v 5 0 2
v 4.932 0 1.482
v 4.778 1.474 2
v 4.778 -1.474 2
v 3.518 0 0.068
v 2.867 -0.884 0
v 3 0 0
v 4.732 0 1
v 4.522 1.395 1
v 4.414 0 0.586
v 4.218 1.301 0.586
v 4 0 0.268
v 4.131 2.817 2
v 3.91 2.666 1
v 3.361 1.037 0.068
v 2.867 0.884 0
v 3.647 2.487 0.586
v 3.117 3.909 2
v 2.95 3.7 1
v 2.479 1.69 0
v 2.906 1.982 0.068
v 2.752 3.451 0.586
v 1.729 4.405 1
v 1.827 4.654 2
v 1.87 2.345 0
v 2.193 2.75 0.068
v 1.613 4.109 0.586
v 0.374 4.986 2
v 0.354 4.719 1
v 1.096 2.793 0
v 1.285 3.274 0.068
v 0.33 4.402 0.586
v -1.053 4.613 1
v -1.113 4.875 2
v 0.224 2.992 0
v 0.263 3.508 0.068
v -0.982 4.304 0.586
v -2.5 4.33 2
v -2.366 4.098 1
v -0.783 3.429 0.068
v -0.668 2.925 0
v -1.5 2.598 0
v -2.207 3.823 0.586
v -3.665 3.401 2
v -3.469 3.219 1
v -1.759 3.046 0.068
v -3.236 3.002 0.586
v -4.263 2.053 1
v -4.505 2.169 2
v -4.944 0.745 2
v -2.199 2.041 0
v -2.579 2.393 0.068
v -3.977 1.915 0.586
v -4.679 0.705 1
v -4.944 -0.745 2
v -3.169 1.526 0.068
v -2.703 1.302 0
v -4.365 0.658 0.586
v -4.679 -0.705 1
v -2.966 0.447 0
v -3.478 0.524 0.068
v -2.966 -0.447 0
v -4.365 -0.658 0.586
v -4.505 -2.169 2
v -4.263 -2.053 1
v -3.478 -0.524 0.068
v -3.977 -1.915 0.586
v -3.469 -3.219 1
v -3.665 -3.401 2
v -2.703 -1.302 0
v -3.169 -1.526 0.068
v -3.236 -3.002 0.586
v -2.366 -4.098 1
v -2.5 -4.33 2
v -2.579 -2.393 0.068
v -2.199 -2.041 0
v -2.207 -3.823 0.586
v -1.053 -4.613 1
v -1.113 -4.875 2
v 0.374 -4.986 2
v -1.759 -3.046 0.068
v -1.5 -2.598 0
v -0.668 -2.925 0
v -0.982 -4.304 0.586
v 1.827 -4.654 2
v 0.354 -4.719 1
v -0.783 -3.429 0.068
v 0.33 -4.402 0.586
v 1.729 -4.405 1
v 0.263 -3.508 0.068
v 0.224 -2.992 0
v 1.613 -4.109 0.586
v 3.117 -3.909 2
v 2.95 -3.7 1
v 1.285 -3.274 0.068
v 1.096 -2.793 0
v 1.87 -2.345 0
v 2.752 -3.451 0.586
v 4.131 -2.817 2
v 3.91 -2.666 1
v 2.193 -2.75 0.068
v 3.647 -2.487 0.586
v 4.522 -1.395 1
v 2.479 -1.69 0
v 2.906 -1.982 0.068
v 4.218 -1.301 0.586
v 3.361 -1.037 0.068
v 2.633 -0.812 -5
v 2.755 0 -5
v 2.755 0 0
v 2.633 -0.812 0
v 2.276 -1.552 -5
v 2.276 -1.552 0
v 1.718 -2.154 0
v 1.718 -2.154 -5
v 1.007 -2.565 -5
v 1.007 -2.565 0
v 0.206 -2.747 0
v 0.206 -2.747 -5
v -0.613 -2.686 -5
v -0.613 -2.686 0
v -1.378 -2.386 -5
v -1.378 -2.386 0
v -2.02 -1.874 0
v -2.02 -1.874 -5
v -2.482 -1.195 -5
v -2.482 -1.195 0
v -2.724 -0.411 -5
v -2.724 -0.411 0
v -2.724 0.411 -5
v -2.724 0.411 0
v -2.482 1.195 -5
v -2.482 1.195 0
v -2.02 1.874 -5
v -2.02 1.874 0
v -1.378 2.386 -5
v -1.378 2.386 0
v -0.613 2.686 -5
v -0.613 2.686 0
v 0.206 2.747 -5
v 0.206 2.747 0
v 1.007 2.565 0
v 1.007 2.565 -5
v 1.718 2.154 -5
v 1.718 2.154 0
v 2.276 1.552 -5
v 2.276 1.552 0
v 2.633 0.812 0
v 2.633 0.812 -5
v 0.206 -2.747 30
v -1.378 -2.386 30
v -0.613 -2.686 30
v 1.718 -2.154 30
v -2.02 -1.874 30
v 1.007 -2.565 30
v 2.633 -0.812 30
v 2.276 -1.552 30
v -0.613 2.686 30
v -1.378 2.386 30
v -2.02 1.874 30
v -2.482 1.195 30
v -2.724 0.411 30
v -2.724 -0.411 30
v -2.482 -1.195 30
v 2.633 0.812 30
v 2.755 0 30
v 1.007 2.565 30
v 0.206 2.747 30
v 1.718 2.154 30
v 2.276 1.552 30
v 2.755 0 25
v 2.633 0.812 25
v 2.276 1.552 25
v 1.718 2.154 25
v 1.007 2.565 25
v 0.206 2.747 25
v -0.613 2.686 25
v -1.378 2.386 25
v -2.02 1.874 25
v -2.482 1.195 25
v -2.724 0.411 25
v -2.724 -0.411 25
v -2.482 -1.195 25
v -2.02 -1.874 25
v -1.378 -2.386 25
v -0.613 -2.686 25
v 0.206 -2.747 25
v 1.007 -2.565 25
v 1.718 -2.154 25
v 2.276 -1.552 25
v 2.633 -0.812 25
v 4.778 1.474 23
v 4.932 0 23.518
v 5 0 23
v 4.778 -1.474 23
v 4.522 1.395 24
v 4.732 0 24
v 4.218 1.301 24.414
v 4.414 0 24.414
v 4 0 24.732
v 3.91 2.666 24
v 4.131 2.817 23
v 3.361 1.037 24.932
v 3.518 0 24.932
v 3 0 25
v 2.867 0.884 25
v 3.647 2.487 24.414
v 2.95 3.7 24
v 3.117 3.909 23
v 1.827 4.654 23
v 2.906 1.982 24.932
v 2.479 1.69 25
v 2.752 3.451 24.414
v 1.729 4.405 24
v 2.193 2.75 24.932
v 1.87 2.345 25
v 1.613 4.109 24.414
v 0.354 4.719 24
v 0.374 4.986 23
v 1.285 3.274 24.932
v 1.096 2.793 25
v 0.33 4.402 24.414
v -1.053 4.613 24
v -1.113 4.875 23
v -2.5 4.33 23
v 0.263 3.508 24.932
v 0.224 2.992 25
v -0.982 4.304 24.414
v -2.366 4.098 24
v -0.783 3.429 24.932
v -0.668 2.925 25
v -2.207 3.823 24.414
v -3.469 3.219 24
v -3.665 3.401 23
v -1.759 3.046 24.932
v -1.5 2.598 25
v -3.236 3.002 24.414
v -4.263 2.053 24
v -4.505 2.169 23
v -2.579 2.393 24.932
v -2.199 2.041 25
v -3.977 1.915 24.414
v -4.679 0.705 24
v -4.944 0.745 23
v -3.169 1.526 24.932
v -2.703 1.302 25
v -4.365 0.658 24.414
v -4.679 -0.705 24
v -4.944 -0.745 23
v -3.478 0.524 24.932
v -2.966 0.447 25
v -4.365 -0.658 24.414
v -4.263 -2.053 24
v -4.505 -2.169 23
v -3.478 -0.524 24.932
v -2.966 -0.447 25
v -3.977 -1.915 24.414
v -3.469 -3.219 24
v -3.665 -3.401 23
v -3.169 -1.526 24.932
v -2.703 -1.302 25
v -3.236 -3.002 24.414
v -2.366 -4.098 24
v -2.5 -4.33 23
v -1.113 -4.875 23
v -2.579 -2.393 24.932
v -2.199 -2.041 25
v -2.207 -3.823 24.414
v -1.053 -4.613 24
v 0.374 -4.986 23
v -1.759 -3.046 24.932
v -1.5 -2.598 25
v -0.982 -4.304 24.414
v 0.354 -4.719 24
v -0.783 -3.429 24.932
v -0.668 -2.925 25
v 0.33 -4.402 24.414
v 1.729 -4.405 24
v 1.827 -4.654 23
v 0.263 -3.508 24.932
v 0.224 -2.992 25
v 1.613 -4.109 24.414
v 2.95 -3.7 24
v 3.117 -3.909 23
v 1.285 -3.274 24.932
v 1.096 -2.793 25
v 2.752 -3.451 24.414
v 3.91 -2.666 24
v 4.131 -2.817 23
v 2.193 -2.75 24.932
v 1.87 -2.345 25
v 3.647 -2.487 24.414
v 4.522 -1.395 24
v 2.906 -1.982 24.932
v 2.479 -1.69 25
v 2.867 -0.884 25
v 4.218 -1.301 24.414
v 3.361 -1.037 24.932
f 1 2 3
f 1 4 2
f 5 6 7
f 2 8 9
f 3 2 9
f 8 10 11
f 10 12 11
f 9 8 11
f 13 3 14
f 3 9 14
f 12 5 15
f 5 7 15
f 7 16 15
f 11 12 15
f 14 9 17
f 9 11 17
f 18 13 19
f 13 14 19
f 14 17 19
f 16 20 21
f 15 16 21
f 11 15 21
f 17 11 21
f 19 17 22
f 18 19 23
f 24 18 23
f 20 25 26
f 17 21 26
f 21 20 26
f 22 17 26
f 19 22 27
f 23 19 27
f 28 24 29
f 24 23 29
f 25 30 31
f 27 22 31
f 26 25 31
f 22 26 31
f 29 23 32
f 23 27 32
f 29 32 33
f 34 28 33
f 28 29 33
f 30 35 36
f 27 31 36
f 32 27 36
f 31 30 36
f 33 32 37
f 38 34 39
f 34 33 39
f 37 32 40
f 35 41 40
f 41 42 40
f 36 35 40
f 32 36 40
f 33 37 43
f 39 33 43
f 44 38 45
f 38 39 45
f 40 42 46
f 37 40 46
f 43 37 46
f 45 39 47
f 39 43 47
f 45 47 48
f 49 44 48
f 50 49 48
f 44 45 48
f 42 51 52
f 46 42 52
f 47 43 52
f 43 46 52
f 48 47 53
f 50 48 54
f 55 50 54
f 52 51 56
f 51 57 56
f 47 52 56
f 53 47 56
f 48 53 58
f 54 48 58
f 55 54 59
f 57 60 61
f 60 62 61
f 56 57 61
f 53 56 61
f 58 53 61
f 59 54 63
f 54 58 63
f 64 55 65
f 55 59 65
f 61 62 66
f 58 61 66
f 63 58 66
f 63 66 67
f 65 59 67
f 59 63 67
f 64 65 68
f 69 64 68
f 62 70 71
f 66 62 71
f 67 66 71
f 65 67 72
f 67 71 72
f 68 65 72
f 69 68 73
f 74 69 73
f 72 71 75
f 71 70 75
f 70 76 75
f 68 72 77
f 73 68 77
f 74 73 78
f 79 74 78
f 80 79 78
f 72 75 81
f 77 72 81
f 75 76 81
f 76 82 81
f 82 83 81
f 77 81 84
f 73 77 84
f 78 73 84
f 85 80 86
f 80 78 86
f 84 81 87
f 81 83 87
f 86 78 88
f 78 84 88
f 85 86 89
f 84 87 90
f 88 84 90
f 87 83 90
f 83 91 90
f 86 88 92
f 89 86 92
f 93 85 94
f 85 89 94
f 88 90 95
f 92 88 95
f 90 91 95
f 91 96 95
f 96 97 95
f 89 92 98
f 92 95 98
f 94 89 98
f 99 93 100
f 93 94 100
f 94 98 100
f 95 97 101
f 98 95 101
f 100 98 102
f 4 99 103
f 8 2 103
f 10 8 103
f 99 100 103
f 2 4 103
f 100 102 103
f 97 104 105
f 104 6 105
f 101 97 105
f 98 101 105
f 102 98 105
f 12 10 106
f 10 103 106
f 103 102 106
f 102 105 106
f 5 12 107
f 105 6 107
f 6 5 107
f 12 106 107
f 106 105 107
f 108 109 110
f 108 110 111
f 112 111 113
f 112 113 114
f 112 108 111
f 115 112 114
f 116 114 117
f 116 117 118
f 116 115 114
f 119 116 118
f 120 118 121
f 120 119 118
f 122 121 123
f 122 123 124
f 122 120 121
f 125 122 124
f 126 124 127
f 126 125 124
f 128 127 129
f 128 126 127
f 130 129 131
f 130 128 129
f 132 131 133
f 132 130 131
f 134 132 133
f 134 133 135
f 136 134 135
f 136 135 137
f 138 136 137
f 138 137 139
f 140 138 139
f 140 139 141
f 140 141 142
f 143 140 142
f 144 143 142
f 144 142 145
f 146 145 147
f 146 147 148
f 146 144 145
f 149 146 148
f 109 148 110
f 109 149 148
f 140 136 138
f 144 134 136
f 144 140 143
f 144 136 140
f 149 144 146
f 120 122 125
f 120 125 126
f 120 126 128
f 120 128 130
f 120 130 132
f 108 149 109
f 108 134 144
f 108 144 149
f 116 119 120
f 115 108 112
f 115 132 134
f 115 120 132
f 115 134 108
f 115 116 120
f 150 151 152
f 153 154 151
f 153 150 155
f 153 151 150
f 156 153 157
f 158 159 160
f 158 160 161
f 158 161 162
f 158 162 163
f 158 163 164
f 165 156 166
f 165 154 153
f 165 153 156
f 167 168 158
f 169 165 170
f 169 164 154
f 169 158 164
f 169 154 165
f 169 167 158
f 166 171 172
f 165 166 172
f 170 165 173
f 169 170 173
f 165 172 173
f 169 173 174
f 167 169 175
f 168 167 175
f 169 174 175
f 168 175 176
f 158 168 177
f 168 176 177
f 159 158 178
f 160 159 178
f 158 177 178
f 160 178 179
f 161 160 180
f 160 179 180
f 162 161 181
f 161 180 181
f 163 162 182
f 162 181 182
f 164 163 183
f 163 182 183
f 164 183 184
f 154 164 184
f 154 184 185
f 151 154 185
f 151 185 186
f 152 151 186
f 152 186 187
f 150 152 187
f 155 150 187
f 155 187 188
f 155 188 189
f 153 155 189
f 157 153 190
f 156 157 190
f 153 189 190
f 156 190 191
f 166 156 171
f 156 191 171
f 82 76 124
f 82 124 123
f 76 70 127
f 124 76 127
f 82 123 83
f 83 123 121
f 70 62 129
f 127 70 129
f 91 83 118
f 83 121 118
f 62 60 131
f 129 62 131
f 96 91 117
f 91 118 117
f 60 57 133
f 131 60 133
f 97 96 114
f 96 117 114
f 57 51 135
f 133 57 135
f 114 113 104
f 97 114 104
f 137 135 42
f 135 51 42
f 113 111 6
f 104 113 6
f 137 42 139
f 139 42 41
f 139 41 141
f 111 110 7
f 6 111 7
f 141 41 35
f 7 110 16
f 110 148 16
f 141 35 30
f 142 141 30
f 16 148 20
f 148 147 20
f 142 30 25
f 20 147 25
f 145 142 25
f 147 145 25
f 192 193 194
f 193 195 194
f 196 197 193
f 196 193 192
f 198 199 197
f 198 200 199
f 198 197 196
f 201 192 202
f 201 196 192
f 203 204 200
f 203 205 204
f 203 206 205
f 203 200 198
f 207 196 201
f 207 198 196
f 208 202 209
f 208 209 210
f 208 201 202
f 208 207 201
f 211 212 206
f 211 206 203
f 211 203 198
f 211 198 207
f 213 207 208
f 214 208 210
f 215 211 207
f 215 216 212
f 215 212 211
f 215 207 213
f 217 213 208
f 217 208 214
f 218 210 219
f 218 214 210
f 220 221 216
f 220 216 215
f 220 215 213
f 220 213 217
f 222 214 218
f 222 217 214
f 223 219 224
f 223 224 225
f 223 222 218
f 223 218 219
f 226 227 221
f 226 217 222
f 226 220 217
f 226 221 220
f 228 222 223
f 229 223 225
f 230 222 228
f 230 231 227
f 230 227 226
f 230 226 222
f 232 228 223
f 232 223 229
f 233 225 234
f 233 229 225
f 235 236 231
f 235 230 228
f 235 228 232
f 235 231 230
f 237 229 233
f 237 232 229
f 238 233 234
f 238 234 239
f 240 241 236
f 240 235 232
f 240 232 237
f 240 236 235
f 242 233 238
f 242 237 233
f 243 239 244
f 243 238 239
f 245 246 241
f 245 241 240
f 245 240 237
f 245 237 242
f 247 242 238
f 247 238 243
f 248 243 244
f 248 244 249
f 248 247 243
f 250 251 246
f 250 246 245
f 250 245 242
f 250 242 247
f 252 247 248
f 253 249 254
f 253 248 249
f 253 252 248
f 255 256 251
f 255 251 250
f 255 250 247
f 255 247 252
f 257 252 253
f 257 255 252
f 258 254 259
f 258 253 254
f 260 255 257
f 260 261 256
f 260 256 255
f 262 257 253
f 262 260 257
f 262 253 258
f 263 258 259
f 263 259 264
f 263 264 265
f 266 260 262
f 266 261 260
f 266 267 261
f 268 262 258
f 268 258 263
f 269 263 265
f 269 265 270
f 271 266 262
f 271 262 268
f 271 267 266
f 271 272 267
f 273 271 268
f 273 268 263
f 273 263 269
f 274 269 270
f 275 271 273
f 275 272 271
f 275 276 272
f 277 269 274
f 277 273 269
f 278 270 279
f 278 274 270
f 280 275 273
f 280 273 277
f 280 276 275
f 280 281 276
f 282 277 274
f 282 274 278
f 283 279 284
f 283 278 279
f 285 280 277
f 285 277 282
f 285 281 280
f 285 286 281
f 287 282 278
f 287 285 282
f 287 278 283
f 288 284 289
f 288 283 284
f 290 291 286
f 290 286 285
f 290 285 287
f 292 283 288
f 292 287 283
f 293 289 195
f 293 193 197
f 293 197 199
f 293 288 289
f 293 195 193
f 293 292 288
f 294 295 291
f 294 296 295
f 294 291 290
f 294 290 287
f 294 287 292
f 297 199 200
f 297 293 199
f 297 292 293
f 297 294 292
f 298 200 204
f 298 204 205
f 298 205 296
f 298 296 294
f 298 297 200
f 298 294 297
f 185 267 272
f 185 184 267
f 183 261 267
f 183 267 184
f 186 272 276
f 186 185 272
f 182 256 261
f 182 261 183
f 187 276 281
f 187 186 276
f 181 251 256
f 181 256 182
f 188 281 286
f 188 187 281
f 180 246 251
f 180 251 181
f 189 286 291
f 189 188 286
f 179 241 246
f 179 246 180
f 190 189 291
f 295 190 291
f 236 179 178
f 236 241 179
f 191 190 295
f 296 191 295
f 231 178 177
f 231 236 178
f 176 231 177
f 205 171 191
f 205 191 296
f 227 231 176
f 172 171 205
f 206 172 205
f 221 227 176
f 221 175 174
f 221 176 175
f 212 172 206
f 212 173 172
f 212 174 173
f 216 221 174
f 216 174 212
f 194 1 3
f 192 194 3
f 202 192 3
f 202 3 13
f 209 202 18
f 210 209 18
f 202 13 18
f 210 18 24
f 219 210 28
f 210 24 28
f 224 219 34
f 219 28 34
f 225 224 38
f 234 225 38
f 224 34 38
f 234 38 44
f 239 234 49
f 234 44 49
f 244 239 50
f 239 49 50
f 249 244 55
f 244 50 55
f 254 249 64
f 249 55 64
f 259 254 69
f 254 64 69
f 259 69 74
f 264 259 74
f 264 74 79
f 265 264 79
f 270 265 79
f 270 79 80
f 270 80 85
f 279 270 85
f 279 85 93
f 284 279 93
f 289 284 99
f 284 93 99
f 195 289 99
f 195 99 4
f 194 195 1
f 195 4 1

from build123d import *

# Parameters (mm, degrees)
ESQUISSE1_R        = 5
BOSS_EXTRU_1_DEPTH = 25
ESQUISSE2_R        = 2.755
BOSS_EXTRU_2_DEPTH = 5
BOSS_EXTRU_3_START = 5
ESQUISSE3_R        = 2.755
BOSS_EXTRU_3_DEPTH = 5
CONG_2_R           = 2
CONG_3_R           = 2


with BuildPart() as part:
    # Esquisse1 → Boss.-Extru.1 (new body)
    with BuildSketch(Plane.XY):
        Circle(ESQUISSE1_R)
    extrude(amount=BOSS_EXTRU_1_DEPTH)

    # Esquisse2 → Boss.-Extru.2 (add)
    with BuildSketch(Plane.XY.offset(25)):
        Circle(ESQUISSE2_R)
    extrude(amount=BOSS_EXTRU_2_DEPTH)

    # Esquisse3 → Boss.-Extru.3 (add)
    with BuildSketch(Plane(origin=(0, 0, 0), x_dir=(-1, 0, 0), z_dir=(0, 0, -1)).offset(BOSS_EXTRU_3_START)):
        with Locations(Location((0, 0, 0), (0, 0, 180))):
            Circle(ESQUISSE3_R)
    extrude(amount=-BOSS_EXTRU_3_DEPTH)

    # Congé2
    cong_2_edges = [part.edges().sort_by_distance(p)[0] for p in [
        (-5, 0, 0),
    ]]
    fillet(cong_2_edges, radius=CONG_2_R)

    # Congé3
    cong_3_edges = [part.edges().sort_by_distance(p)[0] for p in [
        (-5, 0, 25),
    ]]
    fillet(cong_3_edges, radius=CONG_3_R)


solid = part.part
